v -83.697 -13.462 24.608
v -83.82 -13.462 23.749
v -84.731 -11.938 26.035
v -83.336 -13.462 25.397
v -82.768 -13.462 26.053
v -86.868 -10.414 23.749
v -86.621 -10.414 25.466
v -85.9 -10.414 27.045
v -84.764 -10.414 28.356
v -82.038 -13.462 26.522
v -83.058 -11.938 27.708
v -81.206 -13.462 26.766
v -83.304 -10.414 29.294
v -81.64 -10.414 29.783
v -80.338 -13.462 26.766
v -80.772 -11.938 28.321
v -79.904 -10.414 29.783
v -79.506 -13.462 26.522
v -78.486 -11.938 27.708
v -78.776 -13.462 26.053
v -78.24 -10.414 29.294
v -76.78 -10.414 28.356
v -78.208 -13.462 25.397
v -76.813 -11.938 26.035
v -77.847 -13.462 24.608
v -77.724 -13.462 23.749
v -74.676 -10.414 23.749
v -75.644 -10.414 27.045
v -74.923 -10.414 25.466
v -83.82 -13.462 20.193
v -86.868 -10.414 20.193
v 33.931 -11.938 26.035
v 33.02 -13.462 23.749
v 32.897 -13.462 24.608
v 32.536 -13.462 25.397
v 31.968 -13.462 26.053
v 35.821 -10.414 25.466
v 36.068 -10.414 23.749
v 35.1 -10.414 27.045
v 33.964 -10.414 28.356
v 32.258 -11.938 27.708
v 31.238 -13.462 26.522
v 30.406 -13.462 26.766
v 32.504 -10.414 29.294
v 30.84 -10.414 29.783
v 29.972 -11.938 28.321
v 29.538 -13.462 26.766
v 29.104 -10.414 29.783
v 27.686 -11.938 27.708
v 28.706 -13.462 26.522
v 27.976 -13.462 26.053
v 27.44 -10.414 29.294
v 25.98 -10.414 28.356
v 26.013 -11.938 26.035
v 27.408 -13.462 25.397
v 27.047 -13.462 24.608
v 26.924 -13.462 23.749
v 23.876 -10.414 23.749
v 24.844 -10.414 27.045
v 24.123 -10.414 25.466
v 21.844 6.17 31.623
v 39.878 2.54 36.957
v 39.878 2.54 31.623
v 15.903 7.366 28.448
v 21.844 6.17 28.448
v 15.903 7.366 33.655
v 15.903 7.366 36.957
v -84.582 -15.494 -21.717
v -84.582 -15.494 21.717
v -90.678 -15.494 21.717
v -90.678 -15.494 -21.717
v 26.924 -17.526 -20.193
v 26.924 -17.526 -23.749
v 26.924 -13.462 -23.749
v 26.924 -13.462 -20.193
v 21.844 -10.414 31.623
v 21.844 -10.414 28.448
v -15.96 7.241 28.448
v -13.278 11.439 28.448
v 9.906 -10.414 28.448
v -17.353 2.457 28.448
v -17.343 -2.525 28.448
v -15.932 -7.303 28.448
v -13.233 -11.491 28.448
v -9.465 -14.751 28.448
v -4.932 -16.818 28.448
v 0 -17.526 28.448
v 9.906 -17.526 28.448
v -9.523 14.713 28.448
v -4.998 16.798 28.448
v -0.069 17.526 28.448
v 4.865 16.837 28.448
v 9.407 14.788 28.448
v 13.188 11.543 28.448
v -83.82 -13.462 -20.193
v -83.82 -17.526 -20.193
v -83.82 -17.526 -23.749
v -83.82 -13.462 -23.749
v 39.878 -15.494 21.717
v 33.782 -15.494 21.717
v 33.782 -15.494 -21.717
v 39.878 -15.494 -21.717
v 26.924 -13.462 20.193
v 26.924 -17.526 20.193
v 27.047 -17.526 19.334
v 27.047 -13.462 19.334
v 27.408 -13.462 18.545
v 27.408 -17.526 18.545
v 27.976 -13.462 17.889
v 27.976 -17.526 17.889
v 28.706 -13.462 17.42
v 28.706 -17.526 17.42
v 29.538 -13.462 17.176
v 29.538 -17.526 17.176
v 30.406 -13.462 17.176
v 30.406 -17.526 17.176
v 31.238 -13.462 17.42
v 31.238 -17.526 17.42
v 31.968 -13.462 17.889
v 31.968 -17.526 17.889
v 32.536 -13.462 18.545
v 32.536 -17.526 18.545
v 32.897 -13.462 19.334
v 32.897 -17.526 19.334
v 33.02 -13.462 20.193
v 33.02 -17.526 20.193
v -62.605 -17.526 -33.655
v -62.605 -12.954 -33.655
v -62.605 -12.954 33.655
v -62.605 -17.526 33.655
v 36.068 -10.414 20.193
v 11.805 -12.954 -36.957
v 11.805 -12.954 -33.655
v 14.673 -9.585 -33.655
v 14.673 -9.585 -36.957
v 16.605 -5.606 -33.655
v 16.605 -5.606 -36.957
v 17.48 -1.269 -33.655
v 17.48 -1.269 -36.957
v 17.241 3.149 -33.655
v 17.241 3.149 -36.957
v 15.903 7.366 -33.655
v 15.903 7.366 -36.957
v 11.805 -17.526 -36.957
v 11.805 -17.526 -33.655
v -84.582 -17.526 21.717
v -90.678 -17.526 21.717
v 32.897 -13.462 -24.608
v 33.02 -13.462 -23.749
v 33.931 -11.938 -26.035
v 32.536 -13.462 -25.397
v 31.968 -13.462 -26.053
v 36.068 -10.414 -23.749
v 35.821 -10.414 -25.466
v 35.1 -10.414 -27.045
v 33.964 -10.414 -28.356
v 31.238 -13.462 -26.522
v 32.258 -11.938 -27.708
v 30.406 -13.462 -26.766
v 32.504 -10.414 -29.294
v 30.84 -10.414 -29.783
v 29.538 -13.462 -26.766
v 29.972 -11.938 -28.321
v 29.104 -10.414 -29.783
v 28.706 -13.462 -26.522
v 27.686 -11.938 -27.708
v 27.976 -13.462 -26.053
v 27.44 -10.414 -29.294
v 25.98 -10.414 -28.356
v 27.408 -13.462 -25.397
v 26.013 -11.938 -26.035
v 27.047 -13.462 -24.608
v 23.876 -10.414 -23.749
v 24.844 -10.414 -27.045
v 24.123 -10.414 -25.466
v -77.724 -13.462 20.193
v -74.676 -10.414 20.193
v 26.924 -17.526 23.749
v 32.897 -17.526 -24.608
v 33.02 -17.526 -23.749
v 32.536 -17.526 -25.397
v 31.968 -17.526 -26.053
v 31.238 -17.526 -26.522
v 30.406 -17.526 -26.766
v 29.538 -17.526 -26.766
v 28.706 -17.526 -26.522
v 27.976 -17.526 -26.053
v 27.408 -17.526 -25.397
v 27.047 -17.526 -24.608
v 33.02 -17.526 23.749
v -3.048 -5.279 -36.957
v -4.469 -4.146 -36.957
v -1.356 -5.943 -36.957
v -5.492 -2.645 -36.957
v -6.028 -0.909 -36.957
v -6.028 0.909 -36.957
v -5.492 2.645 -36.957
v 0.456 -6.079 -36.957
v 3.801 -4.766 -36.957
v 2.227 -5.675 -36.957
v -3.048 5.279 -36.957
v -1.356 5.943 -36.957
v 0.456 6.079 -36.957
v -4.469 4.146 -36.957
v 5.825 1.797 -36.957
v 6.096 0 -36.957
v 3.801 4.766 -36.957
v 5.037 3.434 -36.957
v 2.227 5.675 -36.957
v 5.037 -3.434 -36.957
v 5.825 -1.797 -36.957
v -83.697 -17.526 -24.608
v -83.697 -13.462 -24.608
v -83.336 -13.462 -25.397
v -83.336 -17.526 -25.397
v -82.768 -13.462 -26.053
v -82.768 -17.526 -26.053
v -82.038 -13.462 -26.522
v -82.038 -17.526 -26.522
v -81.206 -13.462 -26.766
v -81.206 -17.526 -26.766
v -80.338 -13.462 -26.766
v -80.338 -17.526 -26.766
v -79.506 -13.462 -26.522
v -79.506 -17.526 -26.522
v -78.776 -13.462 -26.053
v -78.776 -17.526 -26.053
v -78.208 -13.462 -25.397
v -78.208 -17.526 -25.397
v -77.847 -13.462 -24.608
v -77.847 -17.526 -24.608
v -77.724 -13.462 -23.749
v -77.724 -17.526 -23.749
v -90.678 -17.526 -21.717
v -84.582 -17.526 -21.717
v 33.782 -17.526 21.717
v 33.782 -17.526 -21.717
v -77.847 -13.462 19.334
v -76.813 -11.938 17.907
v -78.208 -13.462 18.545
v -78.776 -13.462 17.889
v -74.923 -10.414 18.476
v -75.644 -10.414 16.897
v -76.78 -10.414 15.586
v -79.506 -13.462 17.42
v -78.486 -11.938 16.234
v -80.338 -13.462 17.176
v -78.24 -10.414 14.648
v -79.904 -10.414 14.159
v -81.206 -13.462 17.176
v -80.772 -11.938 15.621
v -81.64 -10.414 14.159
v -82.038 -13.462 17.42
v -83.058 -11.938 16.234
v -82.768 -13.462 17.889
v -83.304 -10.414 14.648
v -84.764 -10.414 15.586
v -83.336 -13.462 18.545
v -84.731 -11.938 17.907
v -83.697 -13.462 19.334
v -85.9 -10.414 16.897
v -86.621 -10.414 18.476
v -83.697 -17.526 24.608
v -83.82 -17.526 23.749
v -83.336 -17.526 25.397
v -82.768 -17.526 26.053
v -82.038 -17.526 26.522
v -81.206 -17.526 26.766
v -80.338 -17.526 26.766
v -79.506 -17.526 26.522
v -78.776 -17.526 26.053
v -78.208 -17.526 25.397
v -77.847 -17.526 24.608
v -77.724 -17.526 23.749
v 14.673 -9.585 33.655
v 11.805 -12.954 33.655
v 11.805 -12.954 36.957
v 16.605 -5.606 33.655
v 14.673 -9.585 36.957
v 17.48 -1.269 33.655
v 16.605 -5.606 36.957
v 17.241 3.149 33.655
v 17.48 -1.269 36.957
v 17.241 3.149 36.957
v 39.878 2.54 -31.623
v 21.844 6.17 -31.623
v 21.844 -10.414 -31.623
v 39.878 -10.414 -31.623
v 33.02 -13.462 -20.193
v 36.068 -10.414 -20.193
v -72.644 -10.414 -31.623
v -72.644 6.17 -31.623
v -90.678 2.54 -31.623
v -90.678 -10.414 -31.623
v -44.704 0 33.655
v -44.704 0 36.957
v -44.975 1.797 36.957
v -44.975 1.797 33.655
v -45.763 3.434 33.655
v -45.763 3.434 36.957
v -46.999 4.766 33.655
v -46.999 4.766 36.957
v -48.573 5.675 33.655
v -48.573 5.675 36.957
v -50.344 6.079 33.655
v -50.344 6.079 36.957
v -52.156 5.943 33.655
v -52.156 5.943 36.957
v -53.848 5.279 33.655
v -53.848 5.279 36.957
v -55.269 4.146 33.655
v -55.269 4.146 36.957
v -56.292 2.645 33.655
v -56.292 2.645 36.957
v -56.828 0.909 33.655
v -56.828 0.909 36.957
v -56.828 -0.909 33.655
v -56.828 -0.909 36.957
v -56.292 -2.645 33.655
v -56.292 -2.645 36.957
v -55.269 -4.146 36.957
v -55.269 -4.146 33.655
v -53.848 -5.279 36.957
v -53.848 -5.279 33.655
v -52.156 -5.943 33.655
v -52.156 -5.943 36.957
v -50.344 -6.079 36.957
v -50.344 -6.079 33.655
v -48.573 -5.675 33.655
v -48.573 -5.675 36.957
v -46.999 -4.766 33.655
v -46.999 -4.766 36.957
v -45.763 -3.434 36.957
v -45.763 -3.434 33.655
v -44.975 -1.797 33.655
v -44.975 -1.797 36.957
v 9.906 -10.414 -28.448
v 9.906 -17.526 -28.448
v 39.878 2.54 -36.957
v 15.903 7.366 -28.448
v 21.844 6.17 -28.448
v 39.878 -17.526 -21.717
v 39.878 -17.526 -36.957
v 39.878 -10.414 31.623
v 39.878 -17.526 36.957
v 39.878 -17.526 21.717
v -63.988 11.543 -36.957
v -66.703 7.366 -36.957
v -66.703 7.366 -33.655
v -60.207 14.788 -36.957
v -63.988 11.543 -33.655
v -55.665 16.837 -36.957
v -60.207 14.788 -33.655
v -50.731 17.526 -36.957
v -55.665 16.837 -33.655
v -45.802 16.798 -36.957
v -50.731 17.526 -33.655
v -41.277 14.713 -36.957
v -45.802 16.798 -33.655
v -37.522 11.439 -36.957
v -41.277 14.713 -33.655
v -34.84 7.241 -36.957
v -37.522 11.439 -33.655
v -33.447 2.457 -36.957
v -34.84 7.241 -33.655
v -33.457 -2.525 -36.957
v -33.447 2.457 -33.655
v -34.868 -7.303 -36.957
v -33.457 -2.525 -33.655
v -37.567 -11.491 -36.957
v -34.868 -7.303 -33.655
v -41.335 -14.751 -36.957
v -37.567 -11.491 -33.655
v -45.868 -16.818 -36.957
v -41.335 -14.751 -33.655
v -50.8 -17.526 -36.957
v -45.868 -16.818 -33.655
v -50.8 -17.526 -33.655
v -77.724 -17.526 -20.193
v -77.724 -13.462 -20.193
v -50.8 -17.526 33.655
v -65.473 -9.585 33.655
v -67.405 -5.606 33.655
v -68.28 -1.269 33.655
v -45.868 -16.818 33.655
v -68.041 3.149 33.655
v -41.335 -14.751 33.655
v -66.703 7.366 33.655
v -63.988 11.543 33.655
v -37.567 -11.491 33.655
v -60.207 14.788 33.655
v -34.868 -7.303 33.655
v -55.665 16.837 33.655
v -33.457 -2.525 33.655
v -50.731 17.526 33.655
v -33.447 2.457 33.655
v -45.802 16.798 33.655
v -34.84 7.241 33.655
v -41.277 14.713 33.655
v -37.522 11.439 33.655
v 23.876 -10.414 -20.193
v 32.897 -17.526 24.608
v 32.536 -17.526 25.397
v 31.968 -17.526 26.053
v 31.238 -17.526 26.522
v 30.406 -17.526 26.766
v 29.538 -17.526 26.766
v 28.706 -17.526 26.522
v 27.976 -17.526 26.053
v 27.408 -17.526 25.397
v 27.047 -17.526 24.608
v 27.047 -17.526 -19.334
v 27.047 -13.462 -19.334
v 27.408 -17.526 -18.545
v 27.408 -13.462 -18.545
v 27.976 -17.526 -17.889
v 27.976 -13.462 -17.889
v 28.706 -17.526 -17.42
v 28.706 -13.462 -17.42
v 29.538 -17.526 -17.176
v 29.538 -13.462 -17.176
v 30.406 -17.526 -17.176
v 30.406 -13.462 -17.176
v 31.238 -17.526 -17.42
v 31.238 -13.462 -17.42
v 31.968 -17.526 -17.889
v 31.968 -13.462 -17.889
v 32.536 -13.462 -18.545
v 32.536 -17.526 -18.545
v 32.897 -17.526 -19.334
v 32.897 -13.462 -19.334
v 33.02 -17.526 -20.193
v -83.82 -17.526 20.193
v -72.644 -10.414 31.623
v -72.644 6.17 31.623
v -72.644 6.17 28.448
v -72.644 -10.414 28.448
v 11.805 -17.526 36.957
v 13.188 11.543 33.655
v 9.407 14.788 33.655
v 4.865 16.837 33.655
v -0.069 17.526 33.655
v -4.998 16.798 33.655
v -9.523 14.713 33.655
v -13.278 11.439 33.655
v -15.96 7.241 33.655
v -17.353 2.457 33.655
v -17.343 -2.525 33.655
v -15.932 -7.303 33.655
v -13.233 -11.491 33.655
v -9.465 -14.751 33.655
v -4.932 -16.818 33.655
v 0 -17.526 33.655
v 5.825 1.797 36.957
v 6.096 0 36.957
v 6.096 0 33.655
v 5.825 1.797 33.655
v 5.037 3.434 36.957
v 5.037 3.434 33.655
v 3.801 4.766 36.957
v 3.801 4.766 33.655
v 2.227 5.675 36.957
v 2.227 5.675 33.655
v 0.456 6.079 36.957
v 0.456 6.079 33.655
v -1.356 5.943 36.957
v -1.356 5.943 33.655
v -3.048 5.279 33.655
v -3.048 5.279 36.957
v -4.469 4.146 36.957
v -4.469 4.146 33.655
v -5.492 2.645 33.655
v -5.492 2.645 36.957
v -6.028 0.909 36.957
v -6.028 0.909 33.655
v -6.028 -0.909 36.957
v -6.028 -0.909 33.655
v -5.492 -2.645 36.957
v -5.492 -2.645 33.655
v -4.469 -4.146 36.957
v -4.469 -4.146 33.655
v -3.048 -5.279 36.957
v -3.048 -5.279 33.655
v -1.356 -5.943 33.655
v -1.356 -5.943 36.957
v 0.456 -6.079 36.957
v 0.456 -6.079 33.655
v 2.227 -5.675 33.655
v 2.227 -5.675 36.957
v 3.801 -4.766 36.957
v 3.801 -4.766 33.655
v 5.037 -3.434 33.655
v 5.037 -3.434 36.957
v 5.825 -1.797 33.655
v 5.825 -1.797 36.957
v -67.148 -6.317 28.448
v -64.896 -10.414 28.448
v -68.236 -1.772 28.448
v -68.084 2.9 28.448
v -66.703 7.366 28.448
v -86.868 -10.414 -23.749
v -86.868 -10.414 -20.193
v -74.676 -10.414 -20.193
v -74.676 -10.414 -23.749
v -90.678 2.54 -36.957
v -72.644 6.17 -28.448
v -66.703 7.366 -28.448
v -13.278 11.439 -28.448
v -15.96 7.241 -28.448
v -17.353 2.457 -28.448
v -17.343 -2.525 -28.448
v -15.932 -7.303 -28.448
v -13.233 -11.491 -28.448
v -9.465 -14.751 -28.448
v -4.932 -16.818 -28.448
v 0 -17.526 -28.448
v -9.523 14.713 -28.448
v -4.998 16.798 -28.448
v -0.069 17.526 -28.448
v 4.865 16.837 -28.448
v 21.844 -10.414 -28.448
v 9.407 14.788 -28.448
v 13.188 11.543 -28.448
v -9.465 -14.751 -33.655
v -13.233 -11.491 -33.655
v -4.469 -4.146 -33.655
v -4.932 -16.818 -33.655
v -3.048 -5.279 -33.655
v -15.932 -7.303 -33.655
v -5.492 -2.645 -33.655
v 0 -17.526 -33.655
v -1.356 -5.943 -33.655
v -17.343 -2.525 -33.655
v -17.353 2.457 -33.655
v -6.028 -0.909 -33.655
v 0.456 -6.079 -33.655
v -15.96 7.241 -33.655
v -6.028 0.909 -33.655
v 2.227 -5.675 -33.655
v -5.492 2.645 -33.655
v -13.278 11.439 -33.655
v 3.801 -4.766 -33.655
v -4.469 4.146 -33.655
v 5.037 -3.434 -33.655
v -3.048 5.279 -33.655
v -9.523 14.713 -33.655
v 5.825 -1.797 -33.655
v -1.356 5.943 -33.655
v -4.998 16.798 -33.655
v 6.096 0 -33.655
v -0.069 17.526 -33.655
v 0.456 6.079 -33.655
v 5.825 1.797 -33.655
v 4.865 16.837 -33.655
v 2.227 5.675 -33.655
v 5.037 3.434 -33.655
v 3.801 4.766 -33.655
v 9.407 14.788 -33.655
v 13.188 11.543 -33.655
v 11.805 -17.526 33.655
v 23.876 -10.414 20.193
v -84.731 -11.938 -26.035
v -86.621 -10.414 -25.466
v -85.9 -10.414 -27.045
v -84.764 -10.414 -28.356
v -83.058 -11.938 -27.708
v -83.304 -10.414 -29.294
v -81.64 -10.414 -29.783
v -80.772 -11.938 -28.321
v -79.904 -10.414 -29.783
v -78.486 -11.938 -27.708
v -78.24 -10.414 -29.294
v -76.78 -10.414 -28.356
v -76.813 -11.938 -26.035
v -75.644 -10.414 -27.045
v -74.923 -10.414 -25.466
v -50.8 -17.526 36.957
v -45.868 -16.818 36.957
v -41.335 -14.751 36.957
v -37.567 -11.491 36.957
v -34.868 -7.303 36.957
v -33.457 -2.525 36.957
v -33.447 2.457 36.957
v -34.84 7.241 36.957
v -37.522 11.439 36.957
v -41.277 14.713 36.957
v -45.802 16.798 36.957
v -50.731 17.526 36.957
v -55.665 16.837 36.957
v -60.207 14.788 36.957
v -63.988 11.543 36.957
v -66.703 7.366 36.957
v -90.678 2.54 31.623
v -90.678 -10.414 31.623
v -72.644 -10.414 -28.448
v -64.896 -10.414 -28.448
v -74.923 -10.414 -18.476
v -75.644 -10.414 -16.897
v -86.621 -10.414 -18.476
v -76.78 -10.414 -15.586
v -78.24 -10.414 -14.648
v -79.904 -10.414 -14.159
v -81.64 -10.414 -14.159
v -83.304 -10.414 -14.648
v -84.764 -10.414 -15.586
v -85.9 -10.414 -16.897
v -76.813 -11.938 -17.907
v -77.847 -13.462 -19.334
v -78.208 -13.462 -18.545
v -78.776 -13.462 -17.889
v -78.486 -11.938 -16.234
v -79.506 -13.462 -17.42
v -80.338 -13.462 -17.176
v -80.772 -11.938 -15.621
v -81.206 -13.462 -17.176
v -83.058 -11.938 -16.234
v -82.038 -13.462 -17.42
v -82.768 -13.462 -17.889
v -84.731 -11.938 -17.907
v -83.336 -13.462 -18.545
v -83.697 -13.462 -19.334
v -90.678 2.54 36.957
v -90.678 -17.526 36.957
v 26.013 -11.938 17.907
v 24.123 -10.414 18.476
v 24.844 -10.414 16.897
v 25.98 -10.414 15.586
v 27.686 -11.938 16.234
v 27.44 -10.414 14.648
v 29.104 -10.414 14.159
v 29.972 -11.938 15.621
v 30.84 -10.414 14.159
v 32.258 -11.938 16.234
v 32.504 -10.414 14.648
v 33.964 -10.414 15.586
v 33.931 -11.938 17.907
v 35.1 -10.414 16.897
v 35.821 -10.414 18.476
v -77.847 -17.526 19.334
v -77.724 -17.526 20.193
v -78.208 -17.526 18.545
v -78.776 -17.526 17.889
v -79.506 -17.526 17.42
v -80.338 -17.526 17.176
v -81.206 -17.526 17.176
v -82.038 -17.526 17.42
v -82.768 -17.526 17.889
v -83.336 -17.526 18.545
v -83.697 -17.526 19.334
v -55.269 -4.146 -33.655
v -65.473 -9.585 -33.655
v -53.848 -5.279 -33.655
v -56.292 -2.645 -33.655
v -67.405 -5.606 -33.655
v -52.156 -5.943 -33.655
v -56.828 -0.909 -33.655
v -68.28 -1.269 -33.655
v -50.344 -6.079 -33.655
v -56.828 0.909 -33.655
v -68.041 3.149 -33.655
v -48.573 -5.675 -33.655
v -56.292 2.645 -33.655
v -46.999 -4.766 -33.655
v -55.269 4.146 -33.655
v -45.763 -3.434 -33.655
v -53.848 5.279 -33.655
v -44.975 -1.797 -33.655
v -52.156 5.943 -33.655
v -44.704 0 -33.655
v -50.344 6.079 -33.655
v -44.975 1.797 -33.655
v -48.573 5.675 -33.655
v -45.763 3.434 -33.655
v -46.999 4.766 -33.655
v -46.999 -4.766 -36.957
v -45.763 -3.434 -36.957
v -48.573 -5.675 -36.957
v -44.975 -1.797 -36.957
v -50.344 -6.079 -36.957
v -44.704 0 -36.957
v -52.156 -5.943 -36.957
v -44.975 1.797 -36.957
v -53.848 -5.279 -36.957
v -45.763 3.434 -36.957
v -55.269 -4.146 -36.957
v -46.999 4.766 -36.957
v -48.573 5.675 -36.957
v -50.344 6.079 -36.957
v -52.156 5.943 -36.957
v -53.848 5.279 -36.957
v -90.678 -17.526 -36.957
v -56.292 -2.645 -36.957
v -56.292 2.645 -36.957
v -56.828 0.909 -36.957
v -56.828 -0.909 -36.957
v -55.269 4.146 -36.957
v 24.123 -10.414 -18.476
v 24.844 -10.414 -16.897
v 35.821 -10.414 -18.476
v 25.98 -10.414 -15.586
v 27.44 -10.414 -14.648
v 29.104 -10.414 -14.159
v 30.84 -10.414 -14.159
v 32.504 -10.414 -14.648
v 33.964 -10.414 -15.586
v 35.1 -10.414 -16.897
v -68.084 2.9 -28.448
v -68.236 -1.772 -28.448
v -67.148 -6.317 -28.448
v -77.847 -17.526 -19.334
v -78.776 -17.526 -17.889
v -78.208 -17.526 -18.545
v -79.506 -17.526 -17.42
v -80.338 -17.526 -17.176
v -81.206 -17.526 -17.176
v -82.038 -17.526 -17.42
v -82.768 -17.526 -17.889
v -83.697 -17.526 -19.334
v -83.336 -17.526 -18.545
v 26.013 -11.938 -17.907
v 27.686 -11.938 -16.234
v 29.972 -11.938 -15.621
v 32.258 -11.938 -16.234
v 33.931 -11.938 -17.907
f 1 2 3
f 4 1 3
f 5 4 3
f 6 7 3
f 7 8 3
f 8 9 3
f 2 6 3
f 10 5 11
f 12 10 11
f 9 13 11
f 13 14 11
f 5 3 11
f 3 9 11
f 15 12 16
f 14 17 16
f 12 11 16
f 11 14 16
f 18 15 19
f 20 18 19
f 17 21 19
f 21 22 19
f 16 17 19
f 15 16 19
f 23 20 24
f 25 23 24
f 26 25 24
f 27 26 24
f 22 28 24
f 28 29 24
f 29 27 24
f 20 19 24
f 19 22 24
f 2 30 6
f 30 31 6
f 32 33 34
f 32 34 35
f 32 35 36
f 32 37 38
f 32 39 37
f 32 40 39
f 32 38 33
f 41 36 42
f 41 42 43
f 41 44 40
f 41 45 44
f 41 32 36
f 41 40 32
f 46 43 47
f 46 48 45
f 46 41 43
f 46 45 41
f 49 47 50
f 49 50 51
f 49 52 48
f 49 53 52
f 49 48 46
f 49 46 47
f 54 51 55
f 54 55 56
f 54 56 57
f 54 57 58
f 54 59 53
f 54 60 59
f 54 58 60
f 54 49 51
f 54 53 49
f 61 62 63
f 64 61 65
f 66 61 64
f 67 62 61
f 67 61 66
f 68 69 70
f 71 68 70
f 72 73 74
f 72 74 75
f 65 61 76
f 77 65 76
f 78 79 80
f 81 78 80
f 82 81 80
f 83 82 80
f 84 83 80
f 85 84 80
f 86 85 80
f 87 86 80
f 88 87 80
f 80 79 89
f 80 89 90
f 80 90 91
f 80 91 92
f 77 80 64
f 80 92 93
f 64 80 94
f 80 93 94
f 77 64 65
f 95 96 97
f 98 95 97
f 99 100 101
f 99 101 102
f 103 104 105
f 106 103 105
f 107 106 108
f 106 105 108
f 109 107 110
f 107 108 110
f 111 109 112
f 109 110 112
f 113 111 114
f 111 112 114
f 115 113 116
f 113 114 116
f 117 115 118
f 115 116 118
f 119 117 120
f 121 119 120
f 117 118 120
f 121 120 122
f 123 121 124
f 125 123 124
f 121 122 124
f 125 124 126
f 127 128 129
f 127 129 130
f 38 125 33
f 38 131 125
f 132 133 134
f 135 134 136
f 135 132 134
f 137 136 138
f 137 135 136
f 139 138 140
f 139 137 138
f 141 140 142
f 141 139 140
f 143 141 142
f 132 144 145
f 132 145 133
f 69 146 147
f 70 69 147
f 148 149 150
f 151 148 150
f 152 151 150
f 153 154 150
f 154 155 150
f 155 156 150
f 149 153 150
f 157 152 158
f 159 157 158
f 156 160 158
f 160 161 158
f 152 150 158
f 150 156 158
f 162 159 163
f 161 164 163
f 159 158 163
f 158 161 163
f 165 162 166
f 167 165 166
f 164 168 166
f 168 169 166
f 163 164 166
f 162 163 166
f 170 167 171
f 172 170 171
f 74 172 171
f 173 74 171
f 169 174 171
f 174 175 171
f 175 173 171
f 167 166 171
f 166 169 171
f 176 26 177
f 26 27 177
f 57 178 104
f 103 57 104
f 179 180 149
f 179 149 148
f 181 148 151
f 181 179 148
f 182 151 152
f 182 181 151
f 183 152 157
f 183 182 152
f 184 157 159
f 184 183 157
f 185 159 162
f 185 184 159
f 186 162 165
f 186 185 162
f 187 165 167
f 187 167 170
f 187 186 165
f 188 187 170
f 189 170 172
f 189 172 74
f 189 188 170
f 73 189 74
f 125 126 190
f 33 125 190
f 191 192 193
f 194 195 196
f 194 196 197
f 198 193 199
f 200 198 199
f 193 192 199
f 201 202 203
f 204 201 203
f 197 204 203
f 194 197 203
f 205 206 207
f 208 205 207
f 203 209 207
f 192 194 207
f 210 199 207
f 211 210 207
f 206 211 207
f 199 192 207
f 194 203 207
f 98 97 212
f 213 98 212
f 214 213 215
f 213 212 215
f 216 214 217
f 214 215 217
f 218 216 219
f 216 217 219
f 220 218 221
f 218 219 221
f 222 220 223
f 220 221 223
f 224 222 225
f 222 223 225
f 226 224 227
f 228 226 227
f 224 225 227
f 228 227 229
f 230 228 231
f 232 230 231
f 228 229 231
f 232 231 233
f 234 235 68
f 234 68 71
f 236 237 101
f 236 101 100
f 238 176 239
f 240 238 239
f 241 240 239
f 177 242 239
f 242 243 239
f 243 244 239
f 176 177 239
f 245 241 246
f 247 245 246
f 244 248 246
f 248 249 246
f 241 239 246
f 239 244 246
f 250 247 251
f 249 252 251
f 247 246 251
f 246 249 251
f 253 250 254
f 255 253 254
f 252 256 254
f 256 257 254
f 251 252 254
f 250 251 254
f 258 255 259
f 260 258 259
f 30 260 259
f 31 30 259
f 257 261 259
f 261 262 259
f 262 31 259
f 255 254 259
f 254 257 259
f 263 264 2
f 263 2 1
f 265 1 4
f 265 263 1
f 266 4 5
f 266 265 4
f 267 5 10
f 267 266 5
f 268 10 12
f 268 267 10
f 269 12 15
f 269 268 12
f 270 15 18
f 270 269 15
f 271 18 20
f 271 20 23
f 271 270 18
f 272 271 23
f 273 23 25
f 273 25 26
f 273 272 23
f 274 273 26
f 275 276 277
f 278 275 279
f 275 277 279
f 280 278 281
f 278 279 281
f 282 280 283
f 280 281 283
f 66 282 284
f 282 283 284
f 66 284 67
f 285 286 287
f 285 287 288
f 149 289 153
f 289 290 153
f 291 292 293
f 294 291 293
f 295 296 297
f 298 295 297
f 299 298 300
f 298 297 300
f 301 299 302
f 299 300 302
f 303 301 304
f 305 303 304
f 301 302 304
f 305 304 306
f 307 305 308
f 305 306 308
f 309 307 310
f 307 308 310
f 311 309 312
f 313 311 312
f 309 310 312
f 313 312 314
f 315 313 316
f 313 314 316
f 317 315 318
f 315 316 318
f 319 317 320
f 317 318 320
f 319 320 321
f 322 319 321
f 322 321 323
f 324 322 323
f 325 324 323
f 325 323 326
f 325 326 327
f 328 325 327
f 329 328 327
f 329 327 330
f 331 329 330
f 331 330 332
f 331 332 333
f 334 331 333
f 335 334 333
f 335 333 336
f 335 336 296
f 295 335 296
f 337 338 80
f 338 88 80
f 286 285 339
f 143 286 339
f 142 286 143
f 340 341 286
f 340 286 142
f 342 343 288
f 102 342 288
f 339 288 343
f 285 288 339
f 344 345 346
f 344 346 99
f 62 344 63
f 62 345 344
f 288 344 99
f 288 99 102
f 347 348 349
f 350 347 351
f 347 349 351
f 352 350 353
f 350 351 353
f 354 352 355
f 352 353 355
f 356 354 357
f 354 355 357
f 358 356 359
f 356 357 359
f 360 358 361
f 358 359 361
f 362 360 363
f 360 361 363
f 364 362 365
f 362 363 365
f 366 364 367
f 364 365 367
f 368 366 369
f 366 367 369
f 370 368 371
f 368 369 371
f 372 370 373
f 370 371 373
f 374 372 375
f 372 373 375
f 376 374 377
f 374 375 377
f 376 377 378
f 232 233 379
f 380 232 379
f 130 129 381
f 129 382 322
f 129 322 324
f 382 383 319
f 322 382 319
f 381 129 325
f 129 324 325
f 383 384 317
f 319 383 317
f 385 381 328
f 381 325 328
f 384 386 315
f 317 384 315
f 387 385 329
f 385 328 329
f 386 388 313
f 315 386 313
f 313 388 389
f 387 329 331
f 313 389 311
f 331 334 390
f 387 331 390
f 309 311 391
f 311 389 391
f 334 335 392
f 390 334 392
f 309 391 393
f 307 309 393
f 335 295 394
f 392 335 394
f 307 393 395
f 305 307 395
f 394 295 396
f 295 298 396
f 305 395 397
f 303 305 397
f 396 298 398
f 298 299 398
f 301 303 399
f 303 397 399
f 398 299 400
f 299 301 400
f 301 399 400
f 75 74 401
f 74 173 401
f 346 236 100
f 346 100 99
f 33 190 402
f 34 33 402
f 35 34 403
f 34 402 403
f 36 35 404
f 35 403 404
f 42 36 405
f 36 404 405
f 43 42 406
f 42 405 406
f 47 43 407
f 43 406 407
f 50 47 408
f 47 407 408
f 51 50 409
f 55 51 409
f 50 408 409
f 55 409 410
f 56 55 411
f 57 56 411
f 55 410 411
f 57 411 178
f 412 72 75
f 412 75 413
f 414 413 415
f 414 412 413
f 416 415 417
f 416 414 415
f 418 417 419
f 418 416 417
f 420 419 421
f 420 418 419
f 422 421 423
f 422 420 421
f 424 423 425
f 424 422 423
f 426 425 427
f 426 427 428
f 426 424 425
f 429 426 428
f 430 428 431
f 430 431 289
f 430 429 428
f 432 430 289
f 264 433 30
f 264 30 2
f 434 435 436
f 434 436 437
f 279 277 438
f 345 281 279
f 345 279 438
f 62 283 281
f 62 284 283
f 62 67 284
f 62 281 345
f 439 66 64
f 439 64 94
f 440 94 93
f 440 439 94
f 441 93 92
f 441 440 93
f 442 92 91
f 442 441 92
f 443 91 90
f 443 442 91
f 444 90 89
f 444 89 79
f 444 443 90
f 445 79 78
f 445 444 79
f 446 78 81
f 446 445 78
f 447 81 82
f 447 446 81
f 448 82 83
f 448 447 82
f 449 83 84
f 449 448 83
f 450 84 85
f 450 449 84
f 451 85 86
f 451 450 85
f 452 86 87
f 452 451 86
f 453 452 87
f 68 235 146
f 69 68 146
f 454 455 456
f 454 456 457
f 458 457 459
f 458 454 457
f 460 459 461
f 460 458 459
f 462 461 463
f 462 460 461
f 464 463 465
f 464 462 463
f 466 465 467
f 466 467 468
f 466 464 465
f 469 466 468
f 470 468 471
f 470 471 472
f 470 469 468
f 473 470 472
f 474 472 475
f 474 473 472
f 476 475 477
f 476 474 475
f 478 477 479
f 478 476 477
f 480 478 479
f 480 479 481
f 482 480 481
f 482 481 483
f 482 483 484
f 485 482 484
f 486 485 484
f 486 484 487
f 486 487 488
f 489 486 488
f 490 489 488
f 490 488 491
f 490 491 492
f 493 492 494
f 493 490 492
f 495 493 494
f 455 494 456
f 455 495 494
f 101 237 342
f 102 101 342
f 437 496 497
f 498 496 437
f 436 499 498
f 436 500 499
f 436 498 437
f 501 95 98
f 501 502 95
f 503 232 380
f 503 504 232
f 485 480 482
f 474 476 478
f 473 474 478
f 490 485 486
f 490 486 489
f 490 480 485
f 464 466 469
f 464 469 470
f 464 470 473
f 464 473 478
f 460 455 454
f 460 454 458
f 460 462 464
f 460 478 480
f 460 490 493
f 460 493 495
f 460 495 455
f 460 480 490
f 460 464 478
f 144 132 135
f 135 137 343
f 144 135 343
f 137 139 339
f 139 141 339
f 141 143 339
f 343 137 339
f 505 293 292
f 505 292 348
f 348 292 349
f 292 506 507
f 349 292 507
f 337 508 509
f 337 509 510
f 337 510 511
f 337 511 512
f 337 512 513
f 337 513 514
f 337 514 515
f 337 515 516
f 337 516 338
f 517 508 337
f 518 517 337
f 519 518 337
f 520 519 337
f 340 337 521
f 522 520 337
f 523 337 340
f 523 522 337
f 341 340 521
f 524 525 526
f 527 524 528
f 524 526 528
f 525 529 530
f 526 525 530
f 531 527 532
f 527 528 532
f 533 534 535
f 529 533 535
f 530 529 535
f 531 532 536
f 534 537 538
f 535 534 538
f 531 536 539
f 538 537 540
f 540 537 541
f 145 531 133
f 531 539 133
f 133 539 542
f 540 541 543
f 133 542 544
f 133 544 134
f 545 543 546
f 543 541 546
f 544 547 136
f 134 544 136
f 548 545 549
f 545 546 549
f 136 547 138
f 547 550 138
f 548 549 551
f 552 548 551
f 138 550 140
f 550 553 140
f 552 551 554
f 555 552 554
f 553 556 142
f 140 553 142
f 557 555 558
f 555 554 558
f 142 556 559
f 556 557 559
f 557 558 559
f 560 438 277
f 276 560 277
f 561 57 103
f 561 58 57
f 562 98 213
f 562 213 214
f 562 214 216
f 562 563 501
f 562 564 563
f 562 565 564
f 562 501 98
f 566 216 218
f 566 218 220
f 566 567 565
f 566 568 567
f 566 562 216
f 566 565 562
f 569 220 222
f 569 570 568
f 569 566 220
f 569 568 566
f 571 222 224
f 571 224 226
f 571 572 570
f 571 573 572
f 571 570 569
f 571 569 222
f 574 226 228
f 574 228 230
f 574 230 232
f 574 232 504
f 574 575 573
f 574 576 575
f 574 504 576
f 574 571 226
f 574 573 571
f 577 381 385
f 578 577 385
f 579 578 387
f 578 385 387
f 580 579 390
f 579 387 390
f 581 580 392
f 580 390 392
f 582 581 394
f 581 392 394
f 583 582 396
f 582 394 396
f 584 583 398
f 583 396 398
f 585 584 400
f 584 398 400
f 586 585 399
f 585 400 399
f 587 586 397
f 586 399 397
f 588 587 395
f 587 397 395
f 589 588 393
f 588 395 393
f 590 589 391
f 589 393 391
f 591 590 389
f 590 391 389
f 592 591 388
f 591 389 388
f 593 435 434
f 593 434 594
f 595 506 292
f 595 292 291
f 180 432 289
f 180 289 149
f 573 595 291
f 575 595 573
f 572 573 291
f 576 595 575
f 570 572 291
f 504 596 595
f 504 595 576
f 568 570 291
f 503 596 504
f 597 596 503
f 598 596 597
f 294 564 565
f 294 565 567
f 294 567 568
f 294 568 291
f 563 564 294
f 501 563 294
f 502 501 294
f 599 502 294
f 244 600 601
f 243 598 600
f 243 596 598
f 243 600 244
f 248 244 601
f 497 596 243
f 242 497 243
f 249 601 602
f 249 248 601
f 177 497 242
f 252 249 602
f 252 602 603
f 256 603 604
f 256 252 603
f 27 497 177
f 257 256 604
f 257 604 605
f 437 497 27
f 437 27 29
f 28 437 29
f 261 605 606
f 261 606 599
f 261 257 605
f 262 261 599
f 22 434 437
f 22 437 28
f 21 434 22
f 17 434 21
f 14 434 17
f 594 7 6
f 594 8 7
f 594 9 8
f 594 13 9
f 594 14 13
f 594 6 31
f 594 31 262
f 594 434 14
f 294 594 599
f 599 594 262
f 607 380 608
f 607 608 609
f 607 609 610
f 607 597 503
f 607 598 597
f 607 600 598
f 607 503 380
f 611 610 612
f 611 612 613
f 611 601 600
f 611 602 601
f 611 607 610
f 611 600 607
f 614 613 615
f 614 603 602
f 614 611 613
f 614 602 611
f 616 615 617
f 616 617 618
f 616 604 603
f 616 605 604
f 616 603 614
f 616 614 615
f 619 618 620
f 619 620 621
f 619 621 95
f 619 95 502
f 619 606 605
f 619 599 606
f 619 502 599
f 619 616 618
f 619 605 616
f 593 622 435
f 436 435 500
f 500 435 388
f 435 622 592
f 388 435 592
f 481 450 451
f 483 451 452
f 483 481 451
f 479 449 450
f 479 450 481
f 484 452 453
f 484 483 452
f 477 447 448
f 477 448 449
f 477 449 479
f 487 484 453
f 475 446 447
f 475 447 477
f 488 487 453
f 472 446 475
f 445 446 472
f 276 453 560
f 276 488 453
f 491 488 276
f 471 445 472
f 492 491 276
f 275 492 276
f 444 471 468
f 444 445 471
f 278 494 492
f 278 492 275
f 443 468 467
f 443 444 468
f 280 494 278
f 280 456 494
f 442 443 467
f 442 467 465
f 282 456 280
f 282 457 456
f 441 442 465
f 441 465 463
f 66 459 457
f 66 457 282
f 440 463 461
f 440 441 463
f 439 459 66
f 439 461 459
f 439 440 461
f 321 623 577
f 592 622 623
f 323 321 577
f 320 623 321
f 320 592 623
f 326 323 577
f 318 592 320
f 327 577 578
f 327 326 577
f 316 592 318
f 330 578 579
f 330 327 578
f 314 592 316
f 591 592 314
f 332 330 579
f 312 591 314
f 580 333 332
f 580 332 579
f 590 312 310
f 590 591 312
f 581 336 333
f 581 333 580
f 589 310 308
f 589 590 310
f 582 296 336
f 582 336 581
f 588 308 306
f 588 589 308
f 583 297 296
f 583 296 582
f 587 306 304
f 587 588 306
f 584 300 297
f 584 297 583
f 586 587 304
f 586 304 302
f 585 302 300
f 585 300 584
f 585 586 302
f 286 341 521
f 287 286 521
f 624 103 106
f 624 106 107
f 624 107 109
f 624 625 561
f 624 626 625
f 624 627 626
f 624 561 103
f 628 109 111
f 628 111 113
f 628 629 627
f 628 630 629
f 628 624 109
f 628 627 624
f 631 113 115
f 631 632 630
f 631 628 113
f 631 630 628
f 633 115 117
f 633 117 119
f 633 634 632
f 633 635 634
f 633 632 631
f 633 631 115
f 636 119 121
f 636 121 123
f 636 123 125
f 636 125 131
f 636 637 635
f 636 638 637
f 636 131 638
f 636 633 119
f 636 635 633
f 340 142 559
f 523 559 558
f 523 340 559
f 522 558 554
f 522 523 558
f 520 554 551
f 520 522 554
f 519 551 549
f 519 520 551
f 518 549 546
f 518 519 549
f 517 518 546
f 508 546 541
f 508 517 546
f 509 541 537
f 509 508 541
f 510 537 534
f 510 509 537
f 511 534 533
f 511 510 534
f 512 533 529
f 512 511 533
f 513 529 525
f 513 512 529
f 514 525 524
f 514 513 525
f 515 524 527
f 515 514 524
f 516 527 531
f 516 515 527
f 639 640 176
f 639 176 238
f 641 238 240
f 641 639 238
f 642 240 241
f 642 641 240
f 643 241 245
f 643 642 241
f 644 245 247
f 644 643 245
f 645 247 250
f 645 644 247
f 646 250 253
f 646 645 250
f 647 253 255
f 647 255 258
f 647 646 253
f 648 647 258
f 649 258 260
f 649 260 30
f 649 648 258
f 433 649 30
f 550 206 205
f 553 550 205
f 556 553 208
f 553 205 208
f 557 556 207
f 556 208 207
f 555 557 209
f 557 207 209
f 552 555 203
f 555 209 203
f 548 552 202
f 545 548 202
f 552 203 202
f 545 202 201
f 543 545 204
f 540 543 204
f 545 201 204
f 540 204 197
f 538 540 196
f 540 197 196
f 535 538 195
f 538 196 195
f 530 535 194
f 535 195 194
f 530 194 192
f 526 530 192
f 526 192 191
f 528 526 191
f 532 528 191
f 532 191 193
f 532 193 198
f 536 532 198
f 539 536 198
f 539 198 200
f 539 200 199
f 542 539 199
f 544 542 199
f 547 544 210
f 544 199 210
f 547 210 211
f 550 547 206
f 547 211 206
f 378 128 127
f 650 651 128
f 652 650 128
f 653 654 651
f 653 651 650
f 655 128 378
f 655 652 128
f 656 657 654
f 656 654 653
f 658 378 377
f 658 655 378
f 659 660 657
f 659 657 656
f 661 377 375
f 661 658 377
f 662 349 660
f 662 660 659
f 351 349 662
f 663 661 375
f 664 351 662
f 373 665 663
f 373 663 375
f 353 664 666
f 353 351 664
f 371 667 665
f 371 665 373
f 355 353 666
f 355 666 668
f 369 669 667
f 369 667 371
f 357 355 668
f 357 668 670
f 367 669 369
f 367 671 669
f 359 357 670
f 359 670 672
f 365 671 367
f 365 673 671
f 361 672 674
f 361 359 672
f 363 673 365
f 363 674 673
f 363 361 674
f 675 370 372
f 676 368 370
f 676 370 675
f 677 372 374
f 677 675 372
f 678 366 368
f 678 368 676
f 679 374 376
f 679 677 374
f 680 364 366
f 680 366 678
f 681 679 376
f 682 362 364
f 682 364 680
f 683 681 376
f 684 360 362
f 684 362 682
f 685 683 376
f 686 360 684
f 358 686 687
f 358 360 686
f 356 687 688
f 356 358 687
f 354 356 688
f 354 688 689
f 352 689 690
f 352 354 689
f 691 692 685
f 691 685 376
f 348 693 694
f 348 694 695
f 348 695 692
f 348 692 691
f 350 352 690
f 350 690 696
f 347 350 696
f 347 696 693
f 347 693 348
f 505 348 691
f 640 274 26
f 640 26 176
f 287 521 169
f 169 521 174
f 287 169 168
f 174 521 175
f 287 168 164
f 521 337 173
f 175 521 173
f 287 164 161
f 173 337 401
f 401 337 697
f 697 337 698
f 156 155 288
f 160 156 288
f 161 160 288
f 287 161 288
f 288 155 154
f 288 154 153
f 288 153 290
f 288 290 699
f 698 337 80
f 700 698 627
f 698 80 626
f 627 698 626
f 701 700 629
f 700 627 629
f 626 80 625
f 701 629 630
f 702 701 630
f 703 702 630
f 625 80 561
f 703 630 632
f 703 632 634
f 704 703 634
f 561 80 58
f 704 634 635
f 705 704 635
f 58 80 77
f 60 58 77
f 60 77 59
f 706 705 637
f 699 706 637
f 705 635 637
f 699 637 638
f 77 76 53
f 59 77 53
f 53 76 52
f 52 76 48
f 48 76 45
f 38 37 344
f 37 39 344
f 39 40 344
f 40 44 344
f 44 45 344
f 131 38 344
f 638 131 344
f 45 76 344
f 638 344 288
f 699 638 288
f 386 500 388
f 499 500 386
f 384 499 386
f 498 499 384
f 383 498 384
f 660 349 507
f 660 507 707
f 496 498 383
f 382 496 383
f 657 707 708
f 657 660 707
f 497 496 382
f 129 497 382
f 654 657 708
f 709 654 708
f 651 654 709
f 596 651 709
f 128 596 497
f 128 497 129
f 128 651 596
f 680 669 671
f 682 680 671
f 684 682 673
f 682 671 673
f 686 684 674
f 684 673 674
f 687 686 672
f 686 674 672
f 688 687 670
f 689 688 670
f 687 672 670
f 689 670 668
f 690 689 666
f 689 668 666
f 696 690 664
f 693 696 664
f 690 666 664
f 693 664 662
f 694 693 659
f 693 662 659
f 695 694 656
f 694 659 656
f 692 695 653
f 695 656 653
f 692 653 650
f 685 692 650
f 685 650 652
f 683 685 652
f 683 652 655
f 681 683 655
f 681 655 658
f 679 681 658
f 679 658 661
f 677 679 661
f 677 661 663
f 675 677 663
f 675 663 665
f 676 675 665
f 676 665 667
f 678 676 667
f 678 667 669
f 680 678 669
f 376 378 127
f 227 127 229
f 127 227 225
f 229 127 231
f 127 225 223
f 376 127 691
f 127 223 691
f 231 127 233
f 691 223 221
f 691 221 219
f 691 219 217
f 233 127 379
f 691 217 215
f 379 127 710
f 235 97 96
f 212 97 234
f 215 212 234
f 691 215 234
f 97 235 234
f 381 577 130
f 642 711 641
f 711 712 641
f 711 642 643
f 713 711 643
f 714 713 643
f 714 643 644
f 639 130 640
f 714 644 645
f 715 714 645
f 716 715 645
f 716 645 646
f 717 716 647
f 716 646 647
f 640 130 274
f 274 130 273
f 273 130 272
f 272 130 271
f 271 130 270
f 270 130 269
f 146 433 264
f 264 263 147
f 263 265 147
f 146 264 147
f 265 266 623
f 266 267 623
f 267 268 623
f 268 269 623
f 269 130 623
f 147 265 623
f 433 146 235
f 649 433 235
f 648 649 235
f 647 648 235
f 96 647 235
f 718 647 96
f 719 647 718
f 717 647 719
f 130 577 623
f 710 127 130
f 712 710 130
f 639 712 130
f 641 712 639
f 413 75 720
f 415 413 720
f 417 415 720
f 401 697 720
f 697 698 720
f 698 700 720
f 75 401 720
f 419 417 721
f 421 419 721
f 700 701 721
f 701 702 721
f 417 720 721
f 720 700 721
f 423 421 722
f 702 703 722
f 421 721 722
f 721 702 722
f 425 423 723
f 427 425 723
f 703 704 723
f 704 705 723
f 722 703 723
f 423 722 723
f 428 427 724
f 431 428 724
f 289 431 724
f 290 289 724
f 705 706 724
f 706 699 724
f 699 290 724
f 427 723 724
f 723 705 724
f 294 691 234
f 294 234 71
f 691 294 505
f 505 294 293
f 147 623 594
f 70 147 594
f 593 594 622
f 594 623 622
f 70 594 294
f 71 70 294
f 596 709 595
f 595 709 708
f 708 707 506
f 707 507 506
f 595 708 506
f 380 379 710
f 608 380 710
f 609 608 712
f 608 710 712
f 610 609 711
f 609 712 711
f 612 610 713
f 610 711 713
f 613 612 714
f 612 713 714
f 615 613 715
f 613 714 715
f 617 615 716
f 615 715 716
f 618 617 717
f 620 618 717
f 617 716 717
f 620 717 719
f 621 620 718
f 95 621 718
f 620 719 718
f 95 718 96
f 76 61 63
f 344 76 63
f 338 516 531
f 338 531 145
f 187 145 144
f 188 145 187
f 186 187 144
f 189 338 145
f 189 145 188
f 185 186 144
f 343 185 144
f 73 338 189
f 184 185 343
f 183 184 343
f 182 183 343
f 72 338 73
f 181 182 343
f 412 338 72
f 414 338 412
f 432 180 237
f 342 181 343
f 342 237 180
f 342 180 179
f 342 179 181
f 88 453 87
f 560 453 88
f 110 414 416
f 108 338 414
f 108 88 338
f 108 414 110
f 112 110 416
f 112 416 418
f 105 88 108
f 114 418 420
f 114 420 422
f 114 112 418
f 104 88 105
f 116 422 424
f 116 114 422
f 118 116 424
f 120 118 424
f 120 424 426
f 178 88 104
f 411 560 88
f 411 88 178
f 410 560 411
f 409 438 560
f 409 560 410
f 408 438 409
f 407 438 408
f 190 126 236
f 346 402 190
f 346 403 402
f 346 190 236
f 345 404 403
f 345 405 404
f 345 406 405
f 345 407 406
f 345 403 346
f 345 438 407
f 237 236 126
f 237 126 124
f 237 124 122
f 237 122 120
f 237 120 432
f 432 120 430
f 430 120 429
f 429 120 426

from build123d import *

# Parameters (mm, degrees)
EXTRUDE1_DEPTH          = 36.957
CUT_EXTRUDE1_DEPTH      = 31.623
CUT_EXTRUDE1_DEPTH_BACK = 31.623
CUT_EXTRUDE2_DEPTH      = 28.448
SKETCH5_R               = 6.096
CUT_EXTRUDE3_DEPTH      = 3.302
SKETCH6_W               = 6.096
SKETCH6_H               = 43.434
CUT_EXTRUDE4_DEPTH      = 2.032
CUT_EXTRUDE5_DEPTH      = 4.064
CUT_EXTRUDE6_DEPTH      = 3.048
CUT_EXTRUDE6_TAPER      = -45
EXTRUDE2_DEPTH          = 3.302
EXTRUDE3_DEPTH          = 3.302
CUT_EXTRUDE7_START      = -33.655
CUT_EXTRUDE7_DEPTH      = 67.31
SKETCH9_R               = 6.096
CUT_EXTRUDE8_DEPTH      = 74.914


with BuildPart() as part:
    # Sketch2 → Extrude1 (new body, symmetric)
    with BuildSketch(Plane.XY):
        with BuildLine():
            Line((0, -17.526), (39.878, -17.526))
            Line((39.878, -17.526), (39.878, 2.54))
            Line((39.878, 2.54), (15.902915456, 7.366))
            ThreePointArc((15.902915456, 7.366), (-14.769177228, 9.435681215), (0, -17.526))
        make_face()
    extrude(amount=EXTRUDE1_DEPTH, both=True)

    # Sketch3 → Cut-Extrude1 (cut, two sides)
    with BuildSketch(Plane.XY) as cut_extrude1_sk:
        Polygon((39.878, -10.414), (39.878, 2.54), (21.844, 6.170105405), (21.844, -10.414), align=None)
    extrude(amount=CUT_EXTRUDE1_DEPTH, mode=Mode.SUBTRACT)
    extrude(cut_extrude1_sk.sketch, amount=-CUT_EXTRUDE1_DEPTH_BACK, mode=Mode.SUBTRACT)

    # Sketch4 → Cut-Extrude2 (cut, symmetric)
    with BuildSketch(Plane.XY):
        with BuildLine():
            Line((9.906, -10.414), (39.878, -10.414))
            Line((39.878, -10.414), (39.878, 2.54))
            Line((39.878, 2.54), (15.902915456, 7.366))
            ThreePointArc((15.902915456, 7.366), (-14.769177228, 9.435681215), (0, -17.526))
            Line((0, -17.526), (9.906, -17.526))
            Line((9.906, -17.526), (9.906, -10.414))
        make_face()
    extrude(amount=CUT_EXTRUDE2_DEPTH, both=True, mode=Mode.SUBTRACT)

    # Sketch5 → Cut-Extrude3 (cut)
    with BuildSketch(Plane.XY.offset(36.957)):
        with BuildLine():
            Line((0, -17.526), (11.804853239, -17.526))
            Line((11.804853239, -17.526), (11.804853239, -12.954))
            ThreePointArc((11.804853239, -12.954), (-6.329647384, 16.343079269), (0, -17.526))
        make_face()
        Circle(SKETCH5_R, mode=Mode.SUBTRACT)
    cut_extrude3 = extrude(amount=-CUT_EXTRUDE3_DEPTH, mode=Mode.SUBTRACT)

    # Sketch6 → Cut-Extrude4 (cut)
    with BuildSketch(Plane.XZ.offset(17.526)):
        with Locations((36.83, 0)):
            Rectangle(SKETCH6_W, SKETCH6_H)
    extrude(amount=-CUT_EXTRUDE4_DEPTH, mode=Mode.SUBTRACT)

    # Sketch7 → Cut-Extrude5 (cut)
    with BuildSketch(Plane.XZ.offset(17.526)):
        with BuildLine():
            Line((26.924, 23.749), (26.924, 20.193))
            ThreePointArc((26.924, 20.193), (29.972, 17.145), (33.02, 20.193))
            Line((33.02, 20.193), (33.02, 23.749))
            ThreePointArc((33.02, 23.749), (29.972, 26.797), (26.924, 23.749))
        make_face()
    cut_extrude5 = extrude(amount=-CUT_EXTRUDE5_DEPTH, mode=Mode.SUBTRACT)

    # Sketch8 → Cut-Extrude6 (cut)
    with BuildSketch(Plane.XZ.offset(13.462)):
        with BuildLine():
            Line((26.924, 23.749), (26.924, 20.193))
            ThreePointArc((26.924, 20.193), (29.972, 17.145), (33.02, 20.193))
            Line((33.02, 20.193), (33.02, 23.749))
            ThreePointArc((33.02, 23.749), (29.972, 26.797), (26.924, 23.749))
        make_face()
    cut_extrude6 = extrude(amount=-CUT_EXTRUDE6_DEPTH, taper=CUT_EXTRUDE6_TAPER, mode=Mode.SUBTRACT)

    # Mirror1: Cut-Extrude3, Cut-Extrude5, Cut-Extrude6 across plane
    add(cut_extrude3.mirror(Plane.XY), mode=Mode.SUBTRACT)
    add(cut_extrude5.mirror(Plane.XY), mode=Mode.SUBTRACT)
    add(cut_extrude6.mirror(Plane.XY), mode=Mode.SUBTRACT)


with BuildPart() as body_2:
    # Mirror3: mirrored copy
    add(part.part.mirror(Plane(origin=(-25.4, 0, 0), x_dir=(0, 0, 1), z_dir=(1, 0, 0))))

    # Sketch10 → Extrude2 (add)
    with BuildSketch(Plane.XY.offset(33.655)):
        with BuildLine():
            Line((-62.604853239, -12.954), (-62.604853239, -17.526))
            Line((-62.604853239, -17.526), (-50.8, -17.526))
            ThreePointArc((-50.8, -17.526), (-36.030822772, 9.435681215), (-66.702915456, 7.366))
            ThreePointArc((-66.702915456, 7.366), (-67.980096377, -3.464818102), (-62.604853239, -12.954))
        make_face()
    extrude(amount=EXTRUDE2_DEPTH)

    # Sketch11 → Extrude3 (add)
    with BuildSketch(Plane(origin=(0, 0, -33.655), x_dir=(-1, 0, 0), z_dir=(0, 0, -1))):
        with BuildLine():
            Line((50.8, -17.526), (62.604853239, -17.526))
            Line((62.604853239, -17.526), (62.604853239, -12.954))
            ThreePointArc((62.604853239, -12.954), (67.980096377, -3.464818102), (66.702915456, 7.366))
            ThreePointArc((66.702915456, 7.366), (36.030822772, 9.435681215), (50.8, -17.526))
        make_face()
    extrude(amount=EXTRUDE3_DEPTH)

    # Sketch12 → Cut-Extrude7 (cut)
    with BuildSketch(Plane.XY.offset(CUT_EXTRUDE7_START)):
        with BuildLine():
            Line((-62.604853239, -12.954), (-62.604853239, -17.526))
            Line((-62.604853239, -17.526), (-50.8, -17.526))
            ThreePointArc((-50.8, -17.526), (-36.030822772, 9.435681215), (-66.702915456, 7.366))
            ThreePointArc((-66.702915456, 7.366), (-67.980096377, -3.464818102), (-62.604853239, -12.954))
        make_face()
    extrude(amount=CUT_EXTRUDE7_DEPTH, mode=Mode.SUBTRACT)

    # Sketch9 → Cut-Extrude8 (cut, through all)
    with BuildSketch(Plane.XY.offset(36.957)):
        with Locations((-50.8, 0)):
            Circle(SKETCH9_R)
    extrude(amount=-CUT_EXTRUDE8_DEPTH, mode=Mode.SUBTRACT)


solid = Compound([part.part, body_2.part])
